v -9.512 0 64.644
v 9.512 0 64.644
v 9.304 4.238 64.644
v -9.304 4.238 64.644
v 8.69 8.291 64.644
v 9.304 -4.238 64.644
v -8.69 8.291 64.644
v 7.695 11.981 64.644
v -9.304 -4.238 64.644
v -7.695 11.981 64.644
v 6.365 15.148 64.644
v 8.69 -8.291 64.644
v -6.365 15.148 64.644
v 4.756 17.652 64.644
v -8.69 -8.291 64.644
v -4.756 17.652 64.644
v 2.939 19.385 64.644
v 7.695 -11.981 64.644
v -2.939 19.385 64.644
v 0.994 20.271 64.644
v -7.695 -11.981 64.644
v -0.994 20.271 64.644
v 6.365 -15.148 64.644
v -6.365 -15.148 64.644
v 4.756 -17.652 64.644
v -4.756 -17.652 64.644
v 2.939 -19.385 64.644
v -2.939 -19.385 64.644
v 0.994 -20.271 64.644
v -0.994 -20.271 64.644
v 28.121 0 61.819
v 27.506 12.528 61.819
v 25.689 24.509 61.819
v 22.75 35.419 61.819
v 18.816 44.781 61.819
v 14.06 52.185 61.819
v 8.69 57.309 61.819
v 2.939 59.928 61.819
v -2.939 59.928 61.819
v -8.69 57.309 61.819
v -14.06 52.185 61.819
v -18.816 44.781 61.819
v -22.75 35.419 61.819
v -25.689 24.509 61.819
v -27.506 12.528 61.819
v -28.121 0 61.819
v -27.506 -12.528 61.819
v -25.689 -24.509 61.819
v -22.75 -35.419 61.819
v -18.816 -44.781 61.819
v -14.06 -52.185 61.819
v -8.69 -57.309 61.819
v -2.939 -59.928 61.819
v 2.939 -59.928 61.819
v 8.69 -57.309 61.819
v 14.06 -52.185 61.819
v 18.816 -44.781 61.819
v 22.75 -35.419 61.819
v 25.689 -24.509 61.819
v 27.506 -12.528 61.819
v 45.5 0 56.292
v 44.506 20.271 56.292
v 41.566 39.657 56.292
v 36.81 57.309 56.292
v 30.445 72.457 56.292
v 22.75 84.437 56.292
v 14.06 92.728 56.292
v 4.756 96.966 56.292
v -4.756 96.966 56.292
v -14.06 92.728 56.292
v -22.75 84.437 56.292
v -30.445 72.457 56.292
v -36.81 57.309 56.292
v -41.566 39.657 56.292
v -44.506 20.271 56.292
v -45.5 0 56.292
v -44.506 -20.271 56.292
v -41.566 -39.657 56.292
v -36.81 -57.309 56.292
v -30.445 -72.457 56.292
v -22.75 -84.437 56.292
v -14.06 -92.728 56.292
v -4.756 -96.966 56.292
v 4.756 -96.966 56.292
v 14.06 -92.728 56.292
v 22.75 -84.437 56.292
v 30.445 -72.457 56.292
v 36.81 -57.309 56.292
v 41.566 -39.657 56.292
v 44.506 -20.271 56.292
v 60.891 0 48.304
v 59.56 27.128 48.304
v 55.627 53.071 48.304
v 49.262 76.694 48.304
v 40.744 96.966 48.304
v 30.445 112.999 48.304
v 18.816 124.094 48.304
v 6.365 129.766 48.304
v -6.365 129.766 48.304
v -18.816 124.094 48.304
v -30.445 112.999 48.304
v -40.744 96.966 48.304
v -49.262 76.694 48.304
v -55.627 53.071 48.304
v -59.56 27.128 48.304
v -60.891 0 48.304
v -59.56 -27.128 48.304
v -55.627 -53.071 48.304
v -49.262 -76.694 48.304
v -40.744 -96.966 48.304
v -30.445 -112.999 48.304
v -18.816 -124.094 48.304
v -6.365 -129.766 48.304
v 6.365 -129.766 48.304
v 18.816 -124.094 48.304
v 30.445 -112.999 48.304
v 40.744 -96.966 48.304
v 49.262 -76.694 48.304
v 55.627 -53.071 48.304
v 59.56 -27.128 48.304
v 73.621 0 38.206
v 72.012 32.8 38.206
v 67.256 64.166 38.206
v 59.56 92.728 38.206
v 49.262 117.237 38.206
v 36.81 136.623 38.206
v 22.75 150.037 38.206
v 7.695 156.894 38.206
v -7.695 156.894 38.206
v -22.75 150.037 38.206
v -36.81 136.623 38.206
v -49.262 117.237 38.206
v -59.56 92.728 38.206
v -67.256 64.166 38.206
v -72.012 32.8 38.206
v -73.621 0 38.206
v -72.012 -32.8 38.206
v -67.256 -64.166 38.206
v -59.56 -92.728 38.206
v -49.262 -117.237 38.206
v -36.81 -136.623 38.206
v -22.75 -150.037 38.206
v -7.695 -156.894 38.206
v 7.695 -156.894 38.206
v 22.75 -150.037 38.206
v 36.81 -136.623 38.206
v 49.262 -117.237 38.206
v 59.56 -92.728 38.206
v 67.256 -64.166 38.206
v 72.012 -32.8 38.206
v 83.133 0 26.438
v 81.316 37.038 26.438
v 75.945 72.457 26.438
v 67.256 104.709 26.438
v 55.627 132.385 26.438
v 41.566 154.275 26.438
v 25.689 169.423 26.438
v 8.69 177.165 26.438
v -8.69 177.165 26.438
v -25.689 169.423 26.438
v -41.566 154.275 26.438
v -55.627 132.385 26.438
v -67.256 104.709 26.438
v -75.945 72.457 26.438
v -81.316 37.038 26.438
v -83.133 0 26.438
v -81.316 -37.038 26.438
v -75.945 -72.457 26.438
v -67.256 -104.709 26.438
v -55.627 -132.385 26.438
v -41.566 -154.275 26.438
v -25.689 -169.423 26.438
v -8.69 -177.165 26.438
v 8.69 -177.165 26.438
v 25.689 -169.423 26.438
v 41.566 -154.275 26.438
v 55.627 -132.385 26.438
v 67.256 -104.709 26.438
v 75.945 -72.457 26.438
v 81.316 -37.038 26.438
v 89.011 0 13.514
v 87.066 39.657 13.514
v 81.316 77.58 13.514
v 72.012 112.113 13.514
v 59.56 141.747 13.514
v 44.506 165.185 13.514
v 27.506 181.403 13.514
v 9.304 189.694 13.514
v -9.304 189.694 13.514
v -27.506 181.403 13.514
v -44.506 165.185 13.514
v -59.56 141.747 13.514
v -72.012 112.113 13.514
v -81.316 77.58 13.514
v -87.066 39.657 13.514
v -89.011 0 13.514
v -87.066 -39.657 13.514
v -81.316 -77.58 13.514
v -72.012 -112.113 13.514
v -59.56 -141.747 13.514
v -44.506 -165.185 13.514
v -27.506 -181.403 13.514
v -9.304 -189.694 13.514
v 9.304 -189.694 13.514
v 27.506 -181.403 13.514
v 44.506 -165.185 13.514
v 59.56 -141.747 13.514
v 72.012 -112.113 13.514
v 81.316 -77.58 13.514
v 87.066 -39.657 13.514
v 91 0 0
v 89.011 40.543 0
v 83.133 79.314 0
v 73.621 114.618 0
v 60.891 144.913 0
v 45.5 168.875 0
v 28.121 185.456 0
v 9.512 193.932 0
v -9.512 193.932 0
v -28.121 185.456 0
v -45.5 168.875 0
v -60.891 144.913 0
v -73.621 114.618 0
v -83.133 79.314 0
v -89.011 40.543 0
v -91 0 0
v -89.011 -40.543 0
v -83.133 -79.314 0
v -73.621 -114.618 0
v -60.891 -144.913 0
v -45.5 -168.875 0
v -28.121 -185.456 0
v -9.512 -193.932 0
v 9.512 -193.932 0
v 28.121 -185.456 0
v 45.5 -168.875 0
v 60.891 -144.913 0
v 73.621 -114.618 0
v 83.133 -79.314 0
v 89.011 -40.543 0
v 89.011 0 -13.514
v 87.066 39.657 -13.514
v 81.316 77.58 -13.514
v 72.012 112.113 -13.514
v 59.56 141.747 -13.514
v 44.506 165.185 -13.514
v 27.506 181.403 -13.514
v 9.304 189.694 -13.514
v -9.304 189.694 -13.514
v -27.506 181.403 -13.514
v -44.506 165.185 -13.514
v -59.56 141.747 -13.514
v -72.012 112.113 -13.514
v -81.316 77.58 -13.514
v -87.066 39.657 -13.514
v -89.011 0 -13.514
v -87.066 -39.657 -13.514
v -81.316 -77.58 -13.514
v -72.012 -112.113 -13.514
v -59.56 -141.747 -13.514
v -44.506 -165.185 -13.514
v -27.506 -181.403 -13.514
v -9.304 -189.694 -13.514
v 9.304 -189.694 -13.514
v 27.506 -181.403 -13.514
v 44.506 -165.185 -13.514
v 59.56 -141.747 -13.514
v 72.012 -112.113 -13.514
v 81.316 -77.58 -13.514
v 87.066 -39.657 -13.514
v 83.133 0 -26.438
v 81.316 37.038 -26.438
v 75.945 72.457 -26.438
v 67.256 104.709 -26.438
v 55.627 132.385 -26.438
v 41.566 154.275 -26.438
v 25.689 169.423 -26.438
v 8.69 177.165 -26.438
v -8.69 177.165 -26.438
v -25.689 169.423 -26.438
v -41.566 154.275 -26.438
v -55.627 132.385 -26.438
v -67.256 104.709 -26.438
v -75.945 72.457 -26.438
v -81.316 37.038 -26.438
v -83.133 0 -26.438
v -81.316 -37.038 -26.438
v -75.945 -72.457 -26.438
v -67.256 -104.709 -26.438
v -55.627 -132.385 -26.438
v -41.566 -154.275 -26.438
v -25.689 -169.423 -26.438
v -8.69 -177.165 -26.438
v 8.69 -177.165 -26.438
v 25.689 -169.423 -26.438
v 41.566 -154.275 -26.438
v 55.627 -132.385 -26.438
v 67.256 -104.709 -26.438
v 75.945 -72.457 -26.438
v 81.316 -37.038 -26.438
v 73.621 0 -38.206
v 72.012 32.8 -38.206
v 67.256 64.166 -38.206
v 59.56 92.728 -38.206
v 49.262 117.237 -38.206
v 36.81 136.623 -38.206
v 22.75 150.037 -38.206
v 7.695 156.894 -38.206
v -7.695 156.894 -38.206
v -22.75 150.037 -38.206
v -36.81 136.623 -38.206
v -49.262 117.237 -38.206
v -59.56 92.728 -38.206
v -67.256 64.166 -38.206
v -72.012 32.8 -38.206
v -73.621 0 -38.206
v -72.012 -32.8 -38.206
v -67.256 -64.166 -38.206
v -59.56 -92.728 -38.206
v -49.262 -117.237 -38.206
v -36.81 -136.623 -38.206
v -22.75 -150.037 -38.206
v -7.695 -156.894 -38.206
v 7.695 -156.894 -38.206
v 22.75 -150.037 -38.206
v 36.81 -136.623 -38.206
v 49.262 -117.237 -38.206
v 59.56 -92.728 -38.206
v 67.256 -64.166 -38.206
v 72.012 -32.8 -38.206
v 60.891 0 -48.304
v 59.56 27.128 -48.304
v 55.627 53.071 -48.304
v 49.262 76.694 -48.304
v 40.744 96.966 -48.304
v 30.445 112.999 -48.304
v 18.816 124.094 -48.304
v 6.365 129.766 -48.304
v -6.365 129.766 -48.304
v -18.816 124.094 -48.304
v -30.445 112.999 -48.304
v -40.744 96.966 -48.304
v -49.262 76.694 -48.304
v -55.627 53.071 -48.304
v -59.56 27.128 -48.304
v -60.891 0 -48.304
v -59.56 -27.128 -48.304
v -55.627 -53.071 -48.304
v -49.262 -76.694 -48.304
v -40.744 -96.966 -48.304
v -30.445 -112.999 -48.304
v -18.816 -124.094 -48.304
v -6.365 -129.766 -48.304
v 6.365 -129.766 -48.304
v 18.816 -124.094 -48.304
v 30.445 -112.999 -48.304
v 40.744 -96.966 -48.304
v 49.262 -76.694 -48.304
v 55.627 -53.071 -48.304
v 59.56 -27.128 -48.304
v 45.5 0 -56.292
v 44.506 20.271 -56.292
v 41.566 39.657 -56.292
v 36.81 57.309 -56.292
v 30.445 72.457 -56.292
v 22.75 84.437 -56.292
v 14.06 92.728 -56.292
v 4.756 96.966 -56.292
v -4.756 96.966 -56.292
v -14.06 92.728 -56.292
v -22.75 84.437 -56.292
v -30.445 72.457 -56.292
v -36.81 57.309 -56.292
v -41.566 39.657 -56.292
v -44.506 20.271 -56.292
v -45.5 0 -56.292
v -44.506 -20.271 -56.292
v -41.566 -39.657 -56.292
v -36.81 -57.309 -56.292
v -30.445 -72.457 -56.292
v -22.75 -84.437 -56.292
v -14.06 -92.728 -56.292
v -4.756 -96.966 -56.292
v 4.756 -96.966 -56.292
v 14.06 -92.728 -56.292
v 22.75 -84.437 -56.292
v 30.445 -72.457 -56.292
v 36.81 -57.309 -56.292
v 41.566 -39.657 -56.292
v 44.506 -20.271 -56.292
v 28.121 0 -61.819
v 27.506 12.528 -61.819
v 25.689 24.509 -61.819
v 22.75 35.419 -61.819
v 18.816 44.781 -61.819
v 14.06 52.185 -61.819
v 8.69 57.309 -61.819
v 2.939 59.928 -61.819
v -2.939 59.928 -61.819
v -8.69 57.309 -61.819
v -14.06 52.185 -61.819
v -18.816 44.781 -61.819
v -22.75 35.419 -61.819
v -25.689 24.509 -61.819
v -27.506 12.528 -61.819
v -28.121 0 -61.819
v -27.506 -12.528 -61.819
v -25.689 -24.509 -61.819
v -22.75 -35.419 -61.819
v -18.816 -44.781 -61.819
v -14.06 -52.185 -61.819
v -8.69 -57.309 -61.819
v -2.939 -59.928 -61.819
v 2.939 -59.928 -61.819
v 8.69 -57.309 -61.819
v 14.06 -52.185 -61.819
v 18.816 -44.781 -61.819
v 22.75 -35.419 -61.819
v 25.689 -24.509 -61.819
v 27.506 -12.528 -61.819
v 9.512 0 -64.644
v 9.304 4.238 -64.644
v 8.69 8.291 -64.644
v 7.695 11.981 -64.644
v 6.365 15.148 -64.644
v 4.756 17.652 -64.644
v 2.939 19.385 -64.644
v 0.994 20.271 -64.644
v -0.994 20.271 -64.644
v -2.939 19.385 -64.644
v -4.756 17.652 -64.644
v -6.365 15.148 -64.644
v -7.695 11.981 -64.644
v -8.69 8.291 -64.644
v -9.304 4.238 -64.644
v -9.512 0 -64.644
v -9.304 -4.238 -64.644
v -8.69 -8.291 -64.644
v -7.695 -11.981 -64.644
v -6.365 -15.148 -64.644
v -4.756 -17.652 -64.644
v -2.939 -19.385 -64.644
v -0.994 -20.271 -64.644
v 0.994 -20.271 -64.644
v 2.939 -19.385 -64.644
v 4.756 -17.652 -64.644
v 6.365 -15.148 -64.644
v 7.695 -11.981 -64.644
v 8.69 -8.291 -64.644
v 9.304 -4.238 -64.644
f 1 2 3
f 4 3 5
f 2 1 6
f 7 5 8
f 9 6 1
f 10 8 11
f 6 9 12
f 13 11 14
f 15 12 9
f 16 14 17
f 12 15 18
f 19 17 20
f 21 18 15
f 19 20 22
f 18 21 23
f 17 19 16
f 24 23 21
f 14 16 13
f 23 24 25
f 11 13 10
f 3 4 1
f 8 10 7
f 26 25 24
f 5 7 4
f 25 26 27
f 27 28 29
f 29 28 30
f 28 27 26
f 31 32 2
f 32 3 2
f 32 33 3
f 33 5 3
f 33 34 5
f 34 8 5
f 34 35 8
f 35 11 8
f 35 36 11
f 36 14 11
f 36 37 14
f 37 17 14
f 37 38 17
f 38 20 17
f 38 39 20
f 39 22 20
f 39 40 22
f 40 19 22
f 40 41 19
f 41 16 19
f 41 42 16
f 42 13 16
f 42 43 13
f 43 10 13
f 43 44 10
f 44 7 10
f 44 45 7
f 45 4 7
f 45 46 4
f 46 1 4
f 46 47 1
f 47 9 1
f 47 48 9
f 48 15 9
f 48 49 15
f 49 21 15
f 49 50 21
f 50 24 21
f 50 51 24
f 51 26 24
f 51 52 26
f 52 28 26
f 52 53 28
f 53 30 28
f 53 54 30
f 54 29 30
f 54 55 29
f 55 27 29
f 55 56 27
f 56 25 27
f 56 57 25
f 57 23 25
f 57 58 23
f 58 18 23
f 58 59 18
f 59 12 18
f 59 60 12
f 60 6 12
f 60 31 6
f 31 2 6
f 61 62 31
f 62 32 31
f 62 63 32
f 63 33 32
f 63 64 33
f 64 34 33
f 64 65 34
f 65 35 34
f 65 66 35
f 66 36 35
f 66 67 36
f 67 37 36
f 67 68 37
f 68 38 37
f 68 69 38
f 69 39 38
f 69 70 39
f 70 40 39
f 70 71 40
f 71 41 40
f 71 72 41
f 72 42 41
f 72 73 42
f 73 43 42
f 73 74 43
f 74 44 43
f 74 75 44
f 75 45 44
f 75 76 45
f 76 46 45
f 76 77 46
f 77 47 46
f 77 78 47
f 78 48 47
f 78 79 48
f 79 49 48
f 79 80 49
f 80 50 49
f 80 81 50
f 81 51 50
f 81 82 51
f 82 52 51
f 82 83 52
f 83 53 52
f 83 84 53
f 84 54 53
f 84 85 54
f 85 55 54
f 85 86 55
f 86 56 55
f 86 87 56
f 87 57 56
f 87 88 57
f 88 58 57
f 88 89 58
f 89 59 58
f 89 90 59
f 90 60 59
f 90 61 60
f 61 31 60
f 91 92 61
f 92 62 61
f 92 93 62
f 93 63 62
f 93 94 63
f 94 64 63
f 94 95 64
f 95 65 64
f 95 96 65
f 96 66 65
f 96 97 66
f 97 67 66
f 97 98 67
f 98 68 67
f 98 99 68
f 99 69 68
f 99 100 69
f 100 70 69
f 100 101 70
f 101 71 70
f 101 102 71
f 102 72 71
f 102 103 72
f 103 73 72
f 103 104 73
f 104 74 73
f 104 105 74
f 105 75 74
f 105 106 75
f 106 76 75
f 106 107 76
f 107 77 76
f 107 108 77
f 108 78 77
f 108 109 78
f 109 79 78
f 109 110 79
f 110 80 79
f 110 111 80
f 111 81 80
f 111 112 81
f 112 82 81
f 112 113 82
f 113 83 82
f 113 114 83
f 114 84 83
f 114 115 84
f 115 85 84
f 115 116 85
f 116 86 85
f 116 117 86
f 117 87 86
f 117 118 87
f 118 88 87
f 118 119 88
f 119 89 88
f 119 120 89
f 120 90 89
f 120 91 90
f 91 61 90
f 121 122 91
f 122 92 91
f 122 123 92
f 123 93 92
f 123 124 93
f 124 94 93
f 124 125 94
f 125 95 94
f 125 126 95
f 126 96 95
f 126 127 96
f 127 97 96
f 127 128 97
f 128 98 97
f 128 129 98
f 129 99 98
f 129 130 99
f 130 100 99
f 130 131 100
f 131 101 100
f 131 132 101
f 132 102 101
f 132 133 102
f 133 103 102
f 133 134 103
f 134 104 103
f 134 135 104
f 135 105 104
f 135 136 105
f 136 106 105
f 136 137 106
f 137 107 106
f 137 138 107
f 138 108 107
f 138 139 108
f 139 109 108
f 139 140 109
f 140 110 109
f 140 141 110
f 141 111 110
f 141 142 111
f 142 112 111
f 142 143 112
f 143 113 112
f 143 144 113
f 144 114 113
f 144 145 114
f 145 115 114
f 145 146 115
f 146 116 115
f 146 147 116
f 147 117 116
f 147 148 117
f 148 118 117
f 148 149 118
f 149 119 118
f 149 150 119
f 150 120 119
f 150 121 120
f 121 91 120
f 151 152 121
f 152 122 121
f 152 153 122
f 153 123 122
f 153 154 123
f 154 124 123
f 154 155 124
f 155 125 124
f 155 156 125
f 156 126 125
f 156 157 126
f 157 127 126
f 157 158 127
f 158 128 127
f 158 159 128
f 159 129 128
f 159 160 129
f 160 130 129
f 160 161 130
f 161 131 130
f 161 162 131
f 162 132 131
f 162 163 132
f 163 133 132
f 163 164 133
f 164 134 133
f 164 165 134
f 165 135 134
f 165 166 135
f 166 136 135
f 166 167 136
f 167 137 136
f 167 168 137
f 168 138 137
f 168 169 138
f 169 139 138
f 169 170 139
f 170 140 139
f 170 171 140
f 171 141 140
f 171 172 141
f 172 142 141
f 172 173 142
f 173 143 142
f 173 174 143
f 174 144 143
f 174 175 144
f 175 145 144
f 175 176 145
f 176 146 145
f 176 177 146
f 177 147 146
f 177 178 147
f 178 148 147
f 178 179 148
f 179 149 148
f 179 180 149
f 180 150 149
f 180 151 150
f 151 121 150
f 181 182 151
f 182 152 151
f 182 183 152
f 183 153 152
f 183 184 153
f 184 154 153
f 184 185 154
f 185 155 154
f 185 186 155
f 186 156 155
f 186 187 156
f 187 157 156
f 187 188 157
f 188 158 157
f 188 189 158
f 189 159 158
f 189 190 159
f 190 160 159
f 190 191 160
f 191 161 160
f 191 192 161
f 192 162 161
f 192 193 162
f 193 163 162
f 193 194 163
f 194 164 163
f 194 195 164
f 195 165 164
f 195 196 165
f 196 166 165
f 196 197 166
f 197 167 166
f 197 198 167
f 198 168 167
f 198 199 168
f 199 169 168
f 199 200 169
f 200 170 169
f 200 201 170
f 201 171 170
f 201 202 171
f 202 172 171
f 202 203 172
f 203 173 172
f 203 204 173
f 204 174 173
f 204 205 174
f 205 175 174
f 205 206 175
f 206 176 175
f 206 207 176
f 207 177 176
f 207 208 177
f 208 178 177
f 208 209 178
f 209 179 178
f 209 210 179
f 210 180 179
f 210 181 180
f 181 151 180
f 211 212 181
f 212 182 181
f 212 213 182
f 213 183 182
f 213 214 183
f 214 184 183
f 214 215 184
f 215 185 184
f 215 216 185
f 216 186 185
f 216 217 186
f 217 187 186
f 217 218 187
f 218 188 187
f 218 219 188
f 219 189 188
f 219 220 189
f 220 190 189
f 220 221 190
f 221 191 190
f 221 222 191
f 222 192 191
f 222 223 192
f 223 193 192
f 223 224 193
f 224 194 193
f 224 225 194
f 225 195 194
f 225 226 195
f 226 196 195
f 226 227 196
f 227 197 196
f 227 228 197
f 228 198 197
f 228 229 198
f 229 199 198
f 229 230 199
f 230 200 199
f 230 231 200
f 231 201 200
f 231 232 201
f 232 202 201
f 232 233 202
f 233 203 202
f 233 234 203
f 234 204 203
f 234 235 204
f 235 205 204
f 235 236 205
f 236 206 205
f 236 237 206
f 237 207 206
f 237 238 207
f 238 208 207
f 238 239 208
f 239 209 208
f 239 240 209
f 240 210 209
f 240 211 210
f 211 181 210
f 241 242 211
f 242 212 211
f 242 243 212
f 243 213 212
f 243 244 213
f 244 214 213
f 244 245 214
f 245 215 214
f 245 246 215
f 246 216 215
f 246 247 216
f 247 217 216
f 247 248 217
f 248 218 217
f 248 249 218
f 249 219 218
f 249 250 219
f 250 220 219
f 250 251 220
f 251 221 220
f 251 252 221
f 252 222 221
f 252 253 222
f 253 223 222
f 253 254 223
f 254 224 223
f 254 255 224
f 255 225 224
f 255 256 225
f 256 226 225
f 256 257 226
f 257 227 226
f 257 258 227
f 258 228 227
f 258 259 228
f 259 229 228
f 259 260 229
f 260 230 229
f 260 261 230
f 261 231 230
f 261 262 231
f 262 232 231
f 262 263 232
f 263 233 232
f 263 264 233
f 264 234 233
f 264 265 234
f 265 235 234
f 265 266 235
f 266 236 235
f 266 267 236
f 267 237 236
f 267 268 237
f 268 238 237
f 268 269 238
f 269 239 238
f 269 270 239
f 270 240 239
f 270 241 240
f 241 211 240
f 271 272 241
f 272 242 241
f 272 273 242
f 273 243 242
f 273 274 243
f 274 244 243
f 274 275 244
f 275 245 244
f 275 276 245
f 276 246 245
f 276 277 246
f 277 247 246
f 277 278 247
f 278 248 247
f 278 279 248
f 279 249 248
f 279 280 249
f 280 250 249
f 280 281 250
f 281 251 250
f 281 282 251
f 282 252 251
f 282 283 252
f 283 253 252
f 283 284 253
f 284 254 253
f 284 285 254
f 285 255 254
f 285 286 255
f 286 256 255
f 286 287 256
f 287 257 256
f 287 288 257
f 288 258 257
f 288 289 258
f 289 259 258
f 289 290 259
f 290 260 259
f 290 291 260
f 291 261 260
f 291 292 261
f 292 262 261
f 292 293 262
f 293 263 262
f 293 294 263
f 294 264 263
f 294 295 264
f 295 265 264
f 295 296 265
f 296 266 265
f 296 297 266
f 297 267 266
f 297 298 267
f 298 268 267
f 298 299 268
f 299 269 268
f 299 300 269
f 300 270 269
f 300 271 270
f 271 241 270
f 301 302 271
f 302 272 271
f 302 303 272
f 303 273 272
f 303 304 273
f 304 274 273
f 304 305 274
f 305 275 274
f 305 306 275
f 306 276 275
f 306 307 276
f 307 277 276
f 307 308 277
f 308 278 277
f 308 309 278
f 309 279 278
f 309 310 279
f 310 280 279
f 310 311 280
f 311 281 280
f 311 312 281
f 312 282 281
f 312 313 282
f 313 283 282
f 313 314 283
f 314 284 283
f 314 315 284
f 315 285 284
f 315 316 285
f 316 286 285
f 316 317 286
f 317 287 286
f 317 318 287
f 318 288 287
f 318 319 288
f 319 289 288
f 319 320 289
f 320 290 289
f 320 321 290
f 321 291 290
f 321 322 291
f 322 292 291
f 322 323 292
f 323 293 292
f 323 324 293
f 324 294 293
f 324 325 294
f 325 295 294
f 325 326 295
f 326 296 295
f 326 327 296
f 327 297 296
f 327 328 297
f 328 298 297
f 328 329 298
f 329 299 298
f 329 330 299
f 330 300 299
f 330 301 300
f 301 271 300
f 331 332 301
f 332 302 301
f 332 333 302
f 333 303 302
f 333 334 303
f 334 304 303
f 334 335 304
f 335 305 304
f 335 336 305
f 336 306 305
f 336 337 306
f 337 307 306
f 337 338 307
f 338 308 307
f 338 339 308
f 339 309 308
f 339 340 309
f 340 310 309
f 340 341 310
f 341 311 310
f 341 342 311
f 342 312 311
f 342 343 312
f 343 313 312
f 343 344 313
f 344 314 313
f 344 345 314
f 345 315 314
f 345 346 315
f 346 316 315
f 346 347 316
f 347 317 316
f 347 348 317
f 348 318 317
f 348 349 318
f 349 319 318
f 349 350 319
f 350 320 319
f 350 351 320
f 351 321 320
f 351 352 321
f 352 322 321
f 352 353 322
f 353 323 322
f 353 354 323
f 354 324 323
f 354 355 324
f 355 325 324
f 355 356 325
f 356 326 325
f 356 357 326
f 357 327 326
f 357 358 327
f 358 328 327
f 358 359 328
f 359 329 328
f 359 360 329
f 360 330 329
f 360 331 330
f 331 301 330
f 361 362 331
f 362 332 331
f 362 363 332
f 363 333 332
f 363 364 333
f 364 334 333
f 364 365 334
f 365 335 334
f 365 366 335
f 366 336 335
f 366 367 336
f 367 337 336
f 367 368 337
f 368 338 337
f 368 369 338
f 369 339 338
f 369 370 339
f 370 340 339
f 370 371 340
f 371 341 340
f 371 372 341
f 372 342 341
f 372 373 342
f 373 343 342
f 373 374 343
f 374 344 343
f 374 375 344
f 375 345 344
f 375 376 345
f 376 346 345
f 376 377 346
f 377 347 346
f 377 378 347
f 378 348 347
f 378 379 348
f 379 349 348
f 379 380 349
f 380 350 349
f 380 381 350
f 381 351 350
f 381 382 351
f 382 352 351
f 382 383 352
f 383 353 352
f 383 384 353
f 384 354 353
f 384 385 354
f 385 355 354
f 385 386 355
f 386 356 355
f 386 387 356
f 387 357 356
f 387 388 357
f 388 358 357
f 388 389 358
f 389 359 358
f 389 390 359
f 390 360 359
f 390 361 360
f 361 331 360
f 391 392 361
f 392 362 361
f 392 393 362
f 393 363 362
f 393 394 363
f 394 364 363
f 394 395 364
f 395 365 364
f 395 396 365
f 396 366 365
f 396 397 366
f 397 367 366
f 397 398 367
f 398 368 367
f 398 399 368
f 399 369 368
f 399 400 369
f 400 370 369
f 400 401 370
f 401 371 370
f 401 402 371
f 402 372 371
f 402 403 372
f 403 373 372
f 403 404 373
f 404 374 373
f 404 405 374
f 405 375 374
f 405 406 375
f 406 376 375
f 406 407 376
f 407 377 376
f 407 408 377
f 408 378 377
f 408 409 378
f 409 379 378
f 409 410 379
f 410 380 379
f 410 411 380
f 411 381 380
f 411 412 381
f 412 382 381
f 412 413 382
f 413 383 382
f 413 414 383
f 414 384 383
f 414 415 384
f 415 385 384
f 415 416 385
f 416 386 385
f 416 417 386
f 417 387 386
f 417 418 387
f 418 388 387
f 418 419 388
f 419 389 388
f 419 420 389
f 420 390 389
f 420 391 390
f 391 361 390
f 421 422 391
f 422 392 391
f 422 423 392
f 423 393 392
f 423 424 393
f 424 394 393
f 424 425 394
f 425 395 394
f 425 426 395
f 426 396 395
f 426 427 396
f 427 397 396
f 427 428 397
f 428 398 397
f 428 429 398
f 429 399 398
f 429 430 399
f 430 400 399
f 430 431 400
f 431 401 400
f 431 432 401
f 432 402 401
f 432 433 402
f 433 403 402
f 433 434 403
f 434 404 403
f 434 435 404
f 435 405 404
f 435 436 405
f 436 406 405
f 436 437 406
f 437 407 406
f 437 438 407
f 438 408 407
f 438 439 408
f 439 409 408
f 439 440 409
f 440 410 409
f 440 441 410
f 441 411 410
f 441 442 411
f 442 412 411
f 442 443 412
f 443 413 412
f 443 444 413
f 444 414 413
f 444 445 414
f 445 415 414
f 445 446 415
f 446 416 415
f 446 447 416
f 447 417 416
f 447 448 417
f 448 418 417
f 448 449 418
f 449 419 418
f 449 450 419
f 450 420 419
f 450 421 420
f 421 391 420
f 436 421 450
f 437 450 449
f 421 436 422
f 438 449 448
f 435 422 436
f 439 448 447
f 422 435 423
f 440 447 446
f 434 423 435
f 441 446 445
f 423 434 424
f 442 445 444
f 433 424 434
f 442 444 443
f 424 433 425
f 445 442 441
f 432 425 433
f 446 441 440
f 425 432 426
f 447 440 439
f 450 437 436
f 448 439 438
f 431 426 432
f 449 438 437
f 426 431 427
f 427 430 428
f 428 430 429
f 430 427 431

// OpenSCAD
// Generated by SolidPython 1.0.1 on 2020-07-29 00:46:48


scale(v = [7, 15, 5]) {
	sphere(r = 13);
}
/***********************************************
*********      SolidPython code:      **********
************************************************
 
# import packages: SolidPython
from solid import *
from solid.utils import *
from itertools import chain, combinations, permutations


class Resize:

    def __init__(self, scad_file):
        self.scad_file = scad_file
        #self.scad_file = import_scad(scad_file)
        # cone/cylinder param:
        self.r1 = 0
        self.r2 = 0
        self.h = 0
        # rectangular prism param:
        self.w = 0
        self.l = 0
        # ellipse param:
        self.r = 0

    # import OpenScad code (file name corresponds to shape)


    # classify shape + parameters
    def assign(self, param1, param2, param3):
        if self.scad_file == 'cone.scad':
            self.r1 = param1
            self.r2 = param2
            self.h = param3
        elif self.scad_file == 'cylinder.scad':
            self.r1 = param1
            self.r2 = param2
            self.h = param3
        elif self.scad_file == 'rectangularPrism.scad':
            self.h = param1
            self.l = param2
            self.w = param3
        else:
            self.r = param1
            self.h = param2

    # resize parameters
    def iterate(self):
        x = range(3, 20, 2)
        i = 1
        if self.scad_file == 'cone.scad':
            tempList = list(permutations(x, 2))
            for temp in tempList:
                param1 = temp[0]
                param2 = temp[1]
                filepath = 'produced_scad_files/' + 'cone' + str(param1) + '_' + str(param2) + '_' + '.scad'
                scad_render_to_file(cylinder(h=param1, r1=param2, r2=0), filepath)

        elif self.scad_file == 'cylinder.scad':
            tempList = list(permutations(x, 3))
            for temp in tempList:
                param1 = temp[0]
                param2 = temp[1]
                filepath = 'produced_scad_files/' + 'cylinder' + str(param1) + '_' + str(param2) + '_' + '.scad'
                scad_render_to_file(cylinder(h=param1, r1=param2, r2=param2), filepath)

        elif self.scad_file == 'rectangularPrism.scad':
            tempList = list(permutations(x, 3))
            for temp in tempList:
                param1 = temp[0]
                param2 = temp[1]
                param3 = temp[2]
                filepath = 'produced_scad_files/' + 'rectangularPrism' + str(param1) + '_' + str(param2) + '_' + str(
                    param3) + '.scad'
                scad_render_to_file(cube(size=(param1, param2, param3)), filepath)

        elif self.scad_file == 'ellipse.scad':
            tempList = list(permutations(x, 4))
            for temp in tempList:
                param1 = temp[0]
                param2 = temp[1]
                param3 = temp[2]
                param4 = temp[3]
                filepath = 'produced_scad_files/' + 'ellipse' + str(param1) + '_' + str(param2) + '_' + str(param3) + '_' + str(param4) + '.scad'
                scad_render_to_file(scale([param1, param2, param3])(sphere(r=param4)), filepath)

    def render_to_scadfile(self):
        scad_render_to_file(scad, 'example.scad') 
 
************************************************/
